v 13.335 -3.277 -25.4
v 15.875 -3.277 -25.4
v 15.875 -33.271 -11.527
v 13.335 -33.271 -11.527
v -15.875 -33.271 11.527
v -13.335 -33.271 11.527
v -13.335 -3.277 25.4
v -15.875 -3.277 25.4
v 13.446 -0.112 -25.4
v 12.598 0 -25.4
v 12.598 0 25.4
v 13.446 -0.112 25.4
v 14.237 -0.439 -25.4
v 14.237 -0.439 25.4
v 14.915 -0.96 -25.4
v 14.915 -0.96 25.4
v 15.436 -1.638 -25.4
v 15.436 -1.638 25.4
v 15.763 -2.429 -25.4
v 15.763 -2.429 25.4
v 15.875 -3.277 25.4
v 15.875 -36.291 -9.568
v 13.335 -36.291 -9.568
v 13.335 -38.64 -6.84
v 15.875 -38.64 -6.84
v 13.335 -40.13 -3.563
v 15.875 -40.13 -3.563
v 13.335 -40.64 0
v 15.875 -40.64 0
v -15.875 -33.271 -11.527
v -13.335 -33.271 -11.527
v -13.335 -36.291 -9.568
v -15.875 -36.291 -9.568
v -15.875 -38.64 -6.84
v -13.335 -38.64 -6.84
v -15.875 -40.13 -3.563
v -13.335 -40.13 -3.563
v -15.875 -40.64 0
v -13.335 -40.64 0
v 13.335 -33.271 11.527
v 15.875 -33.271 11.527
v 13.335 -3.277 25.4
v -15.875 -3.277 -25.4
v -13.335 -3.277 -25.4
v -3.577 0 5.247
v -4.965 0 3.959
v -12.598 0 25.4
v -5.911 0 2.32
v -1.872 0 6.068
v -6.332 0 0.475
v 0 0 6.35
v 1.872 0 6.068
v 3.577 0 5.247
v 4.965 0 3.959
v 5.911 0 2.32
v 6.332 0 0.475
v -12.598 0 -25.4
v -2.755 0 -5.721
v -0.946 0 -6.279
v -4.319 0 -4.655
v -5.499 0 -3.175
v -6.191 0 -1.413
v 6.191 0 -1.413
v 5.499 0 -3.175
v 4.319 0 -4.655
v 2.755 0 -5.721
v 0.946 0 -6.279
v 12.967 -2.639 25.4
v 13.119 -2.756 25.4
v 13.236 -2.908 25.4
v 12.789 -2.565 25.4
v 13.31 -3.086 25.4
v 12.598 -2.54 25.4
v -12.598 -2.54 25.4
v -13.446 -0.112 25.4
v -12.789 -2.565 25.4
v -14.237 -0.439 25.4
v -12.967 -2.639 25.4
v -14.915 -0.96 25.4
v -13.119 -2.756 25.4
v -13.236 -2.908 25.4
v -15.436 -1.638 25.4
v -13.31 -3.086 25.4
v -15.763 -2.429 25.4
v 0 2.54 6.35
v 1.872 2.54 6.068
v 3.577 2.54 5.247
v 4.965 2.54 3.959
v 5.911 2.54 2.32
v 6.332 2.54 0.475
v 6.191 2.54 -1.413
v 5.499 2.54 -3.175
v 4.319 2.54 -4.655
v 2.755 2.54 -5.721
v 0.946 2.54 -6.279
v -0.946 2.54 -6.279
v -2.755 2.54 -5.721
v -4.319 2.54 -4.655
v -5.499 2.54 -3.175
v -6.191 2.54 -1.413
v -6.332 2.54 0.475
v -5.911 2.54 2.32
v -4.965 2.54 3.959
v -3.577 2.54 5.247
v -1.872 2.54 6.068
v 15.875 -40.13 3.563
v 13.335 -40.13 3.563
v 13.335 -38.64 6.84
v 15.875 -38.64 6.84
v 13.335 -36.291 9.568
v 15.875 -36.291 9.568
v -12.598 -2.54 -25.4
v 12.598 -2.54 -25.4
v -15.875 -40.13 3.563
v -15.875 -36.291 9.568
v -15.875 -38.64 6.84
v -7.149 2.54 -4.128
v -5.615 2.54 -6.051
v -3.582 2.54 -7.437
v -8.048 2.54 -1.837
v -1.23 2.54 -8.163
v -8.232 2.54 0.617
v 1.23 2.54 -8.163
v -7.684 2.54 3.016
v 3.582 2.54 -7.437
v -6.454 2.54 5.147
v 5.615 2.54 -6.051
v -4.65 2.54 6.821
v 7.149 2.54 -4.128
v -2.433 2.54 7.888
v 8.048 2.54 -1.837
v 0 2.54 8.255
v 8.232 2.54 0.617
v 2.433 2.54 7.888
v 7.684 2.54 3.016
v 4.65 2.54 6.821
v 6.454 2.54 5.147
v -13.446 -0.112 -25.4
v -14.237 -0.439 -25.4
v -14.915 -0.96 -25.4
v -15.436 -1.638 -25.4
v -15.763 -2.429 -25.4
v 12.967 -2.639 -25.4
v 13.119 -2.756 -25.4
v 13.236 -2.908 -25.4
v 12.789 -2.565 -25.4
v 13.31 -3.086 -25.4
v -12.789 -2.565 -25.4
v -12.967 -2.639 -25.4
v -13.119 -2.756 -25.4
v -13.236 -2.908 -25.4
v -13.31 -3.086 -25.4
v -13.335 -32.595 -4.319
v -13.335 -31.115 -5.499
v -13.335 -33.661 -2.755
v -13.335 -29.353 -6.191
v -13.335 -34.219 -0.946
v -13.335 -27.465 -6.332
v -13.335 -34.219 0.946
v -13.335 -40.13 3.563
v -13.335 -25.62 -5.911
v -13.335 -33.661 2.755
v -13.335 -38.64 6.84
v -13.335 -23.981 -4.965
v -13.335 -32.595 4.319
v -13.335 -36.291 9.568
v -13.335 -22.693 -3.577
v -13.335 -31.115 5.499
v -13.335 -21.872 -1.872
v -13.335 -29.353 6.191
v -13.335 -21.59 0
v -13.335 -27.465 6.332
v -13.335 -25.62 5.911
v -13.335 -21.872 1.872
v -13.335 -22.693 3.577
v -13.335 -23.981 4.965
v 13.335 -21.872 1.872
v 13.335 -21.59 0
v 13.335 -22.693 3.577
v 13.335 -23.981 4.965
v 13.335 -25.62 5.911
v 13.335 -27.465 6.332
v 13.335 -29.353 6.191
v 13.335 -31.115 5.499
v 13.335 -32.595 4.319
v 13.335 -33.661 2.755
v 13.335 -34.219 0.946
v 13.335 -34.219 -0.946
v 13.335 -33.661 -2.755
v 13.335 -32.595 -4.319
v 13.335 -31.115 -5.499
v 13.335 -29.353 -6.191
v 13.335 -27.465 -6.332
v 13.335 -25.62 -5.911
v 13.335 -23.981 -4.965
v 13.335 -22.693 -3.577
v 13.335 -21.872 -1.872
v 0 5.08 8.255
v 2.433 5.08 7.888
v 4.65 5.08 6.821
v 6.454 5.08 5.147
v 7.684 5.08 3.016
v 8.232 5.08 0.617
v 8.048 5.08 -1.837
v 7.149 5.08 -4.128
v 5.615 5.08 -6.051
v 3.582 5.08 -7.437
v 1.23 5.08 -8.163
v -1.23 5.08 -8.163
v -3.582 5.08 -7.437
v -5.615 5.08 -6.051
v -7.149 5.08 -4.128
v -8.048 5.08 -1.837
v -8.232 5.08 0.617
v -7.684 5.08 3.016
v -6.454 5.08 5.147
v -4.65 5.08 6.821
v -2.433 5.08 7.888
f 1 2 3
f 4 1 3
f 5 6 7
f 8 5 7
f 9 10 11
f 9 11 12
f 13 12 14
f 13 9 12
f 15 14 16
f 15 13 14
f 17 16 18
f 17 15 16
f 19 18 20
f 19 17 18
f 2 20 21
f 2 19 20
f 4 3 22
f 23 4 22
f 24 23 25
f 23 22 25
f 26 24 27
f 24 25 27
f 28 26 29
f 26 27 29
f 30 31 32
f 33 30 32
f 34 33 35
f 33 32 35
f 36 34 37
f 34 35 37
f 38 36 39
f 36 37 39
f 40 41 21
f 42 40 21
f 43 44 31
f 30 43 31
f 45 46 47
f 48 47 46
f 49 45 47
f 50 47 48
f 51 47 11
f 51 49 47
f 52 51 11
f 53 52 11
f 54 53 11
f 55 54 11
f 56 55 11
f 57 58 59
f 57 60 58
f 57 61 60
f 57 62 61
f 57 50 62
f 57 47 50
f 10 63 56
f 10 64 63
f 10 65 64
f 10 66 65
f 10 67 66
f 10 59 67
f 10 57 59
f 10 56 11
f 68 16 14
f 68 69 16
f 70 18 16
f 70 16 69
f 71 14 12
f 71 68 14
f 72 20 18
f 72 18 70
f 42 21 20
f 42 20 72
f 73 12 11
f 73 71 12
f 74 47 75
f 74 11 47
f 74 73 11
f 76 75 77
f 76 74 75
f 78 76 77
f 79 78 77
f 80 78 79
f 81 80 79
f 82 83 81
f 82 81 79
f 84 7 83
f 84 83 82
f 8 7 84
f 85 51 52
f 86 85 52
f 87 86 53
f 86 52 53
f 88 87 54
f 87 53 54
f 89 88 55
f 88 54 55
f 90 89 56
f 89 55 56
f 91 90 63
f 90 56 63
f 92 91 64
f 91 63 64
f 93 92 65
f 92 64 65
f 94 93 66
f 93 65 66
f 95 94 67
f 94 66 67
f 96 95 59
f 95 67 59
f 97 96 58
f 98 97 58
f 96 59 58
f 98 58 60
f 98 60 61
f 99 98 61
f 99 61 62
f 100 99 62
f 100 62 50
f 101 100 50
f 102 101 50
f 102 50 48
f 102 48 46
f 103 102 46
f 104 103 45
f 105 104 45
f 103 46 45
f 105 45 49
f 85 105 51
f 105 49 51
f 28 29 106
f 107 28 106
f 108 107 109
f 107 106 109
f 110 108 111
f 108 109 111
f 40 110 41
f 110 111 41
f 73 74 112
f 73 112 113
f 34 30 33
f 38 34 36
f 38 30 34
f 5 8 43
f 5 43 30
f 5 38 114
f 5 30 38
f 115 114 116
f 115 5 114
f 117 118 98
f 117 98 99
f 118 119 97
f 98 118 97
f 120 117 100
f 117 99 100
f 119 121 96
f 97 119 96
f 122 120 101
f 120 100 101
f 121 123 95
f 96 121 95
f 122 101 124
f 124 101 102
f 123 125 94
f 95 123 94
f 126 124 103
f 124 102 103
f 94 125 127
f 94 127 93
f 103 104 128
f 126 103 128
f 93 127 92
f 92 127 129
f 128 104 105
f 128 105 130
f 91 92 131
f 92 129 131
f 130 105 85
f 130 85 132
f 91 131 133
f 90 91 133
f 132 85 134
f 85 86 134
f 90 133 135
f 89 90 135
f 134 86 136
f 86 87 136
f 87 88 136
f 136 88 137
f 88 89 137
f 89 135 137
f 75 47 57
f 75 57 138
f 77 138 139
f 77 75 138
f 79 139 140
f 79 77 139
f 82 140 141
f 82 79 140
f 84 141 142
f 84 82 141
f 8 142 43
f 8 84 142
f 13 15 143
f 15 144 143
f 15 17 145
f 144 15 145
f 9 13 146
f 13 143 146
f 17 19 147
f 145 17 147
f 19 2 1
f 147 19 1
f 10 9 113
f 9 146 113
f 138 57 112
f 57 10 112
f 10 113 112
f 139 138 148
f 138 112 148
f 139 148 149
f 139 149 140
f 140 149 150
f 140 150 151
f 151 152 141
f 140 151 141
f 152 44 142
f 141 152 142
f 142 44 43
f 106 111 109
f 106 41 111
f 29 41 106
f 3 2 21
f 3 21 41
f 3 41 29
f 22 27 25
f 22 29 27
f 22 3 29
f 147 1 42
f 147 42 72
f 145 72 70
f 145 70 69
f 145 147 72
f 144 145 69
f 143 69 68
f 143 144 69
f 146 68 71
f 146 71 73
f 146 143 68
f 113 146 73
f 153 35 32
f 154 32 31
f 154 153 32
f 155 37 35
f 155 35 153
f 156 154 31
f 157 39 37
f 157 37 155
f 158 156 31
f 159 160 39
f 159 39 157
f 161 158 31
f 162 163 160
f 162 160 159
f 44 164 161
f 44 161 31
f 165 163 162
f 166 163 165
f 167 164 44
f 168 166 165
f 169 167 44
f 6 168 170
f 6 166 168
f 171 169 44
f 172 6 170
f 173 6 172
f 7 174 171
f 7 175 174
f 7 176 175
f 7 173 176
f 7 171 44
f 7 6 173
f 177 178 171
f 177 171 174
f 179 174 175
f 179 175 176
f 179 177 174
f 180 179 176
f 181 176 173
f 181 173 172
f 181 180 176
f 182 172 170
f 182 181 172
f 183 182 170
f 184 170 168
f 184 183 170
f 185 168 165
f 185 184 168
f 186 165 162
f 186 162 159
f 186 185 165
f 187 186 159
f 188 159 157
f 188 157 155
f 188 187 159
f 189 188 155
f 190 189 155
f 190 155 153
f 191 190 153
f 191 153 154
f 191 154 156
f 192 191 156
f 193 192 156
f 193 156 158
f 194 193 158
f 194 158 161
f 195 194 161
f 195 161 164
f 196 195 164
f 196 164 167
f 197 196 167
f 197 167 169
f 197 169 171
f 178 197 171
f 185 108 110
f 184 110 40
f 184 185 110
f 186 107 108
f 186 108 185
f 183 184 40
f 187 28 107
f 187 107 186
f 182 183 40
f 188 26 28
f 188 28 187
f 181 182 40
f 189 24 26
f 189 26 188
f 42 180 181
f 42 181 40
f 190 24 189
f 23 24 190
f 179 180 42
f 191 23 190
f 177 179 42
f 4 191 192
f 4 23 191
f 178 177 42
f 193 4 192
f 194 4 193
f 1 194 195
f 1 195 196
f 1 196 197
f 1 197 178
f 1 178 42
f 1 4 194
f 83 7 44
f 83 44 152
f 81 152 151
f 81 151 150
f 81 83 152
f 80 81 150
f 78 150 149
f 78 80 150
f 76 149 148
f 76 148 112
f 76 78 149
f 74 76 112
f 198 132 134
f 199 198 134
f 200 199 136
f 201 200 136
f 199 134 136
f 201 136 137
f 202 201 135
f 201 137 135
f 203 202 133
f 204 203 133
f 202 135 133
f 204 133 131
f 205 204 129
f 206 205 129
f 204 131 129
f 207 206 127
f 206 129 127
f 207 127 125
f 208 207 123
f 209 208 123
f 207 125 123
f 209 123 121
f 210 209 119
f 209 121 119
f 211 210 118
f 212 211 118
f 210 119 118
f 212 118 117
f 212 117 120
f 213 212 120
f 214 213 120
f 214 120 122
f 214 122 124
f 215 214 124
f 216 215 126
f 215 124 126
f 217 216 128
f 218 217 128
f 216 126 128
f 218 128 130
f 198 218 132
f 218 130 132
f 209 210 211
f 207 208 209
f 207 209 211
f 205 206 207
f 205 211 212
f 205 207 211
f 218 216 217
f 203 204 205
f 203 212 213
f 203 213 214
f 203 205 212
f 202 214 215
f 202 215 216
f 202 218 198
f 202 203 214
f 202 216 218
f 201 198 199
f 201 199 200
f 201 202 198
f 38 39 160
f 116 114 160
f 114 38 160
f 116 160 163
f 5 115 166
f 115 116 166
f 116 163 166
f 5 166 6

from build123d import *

# Parameters (mm, degrees)
SKETCH2_W                      = 31.75
SKETCH2_H                      = 50.8
BASE_FLANGE1_DEPTH             = 2.54
EDGE_FLANGE1_STRIP_W           = 11.6332
EDGE_FLANGE1_STRIP_H           = 2.54
EDGE_FLANGE1_STRIP_CUT_DEPTH   = 50.8
EDGE_FLANGE1_STRIP_2_W         = 11.6332
EDGE_FLANGE1_STRIP_2_H         = 2.54
EDGE_FLANGE1_STRIP_CUT_2_DEPTH = 50.8
EDGE_FLANGE1_DEPTH             = 50.8
EDGE_FLANGE1_BEND_DEPTH        = 50.8
CUT_EXTRUDE1_DEPTH             = 58.487669113
BOSS_EXTRUDE1_START            = -2.54
SKETCH14_R                     = 6.35
BOSS_EXTRUDE1_DEPTH            = 27.94
SKETCH15_R                     = 6.35
BOSS_EXTRUDE2_DEPTH            = 2.54
SKETCH16_R                     = 8.255
BOSS_EXTRUDE3_DEPTH            = 2.54


# Sheet-metal steps are written as plain solids
with BuildPart() as part:
    # Sketch2 → Base-Flange1 (new body)
    with BuildSketch(Plane(origin=(0, 0, 0), x_dir=(1, 0, 0), z_dir=(0, 1, 0))):
        Rectangle(SKETCH2_W, SKETCH2_H)
    extrude(amount=-BASE_FLANGE1_DEPTH)

    # Edge-Flange1 strip (across the edge) → Edge-Flange1 strip cut (cut)
    with BuildSketch(Plane(origin=(15.875, -2.54, -25.4), x_dir=(-1, 0, 0), z_dir=(0, 0, 1))):
        with Locations((-2.54, -1.27)):
            Rectangle(EDGE_FLANGE1_STRIP_W, EDGE_FLANGE1_STRIP_H)
    extrude(amount=EDGE_FLANGE1_STRIP_CUT_DEPTH, mode=Mode.SUBTRACT)

    # Edge-Flange1 strip 2 (across the edge) → Edge-Flange1 strip cut 2 (cut)
    with BuildSketch(Plane(origin=(-15.875, -2.54, 25.4), x_dir=(1, 0, 0), z_dir=(0, 0, -1))):
        with Locations((-2.54, -1.27)):
            Rectangle(EDGE_FLANGE1_STRIP_2_W, EDGE_FLANGE1_STRIP_2_H)
    extrude(amount=EDGE_FLANGE1_STRIP_CUT_2_DEPTH, mode=Mode.SUBTRACT)

    # Edge-Flange1 section (across the edge) → Edge-Flange1 (add)
    with BuildSketch(Plane(origin=(15.875, -2.54, -25.4), x_dir=(-1, 0, 0), z_dir=(0, 0, 1))):
        with BuildLine():
            Line((0, 0.7366), (0, 38.1))
            Line((0, 38.1), (2.54, 38.1))
            Line((2.54, 38.1), (2.54, 0.7366))
            ThreePointArc((2.54, 0.7366), (2.755745145, 0.215745145), (3.2766, 0))
            Line((3.2766, 0), (3.2766, -2.54))
            ThreePointArc((3.2766, -2.54), (0.959693921, -1.580306079), (0, 0.7366))
        make_face()
    extrude(amount=EDGE_FLANGE1_DEPTH)

    # Edge-Flange1 section 2 (across the edge) → Edge-Flange1 bend (add)
    with BuildSketch(Plane(origin=(-15.875, -2.54, 25.4), x_dir=(1, 0, 0), z_dir=(0, 0, -1))):
        with BuildLine():
            Line((0, 0.7366), (0, 38.1))
            Line((0, 38.1), (2.54, 38.1))
            Line((2.54, 38.1), (2.54, 0.7366))
            ThreePointArc((2.54, 0.7366), (2.755745145, 0.215745145), (3.2766, 0))
            Line((3.2766, 0), (3.2766, -2.54))
            ThreePointArc((3.2766, -2.54), (0.959693921, -1.580306079), (0, 0.7366))
        make_face()
    extrude(amount=EDGE_FLANGE1_BEND_DEPTH)

    # Sketch13 → Cut-Extrude1 (cut, through all)
    with BuildSketch(Plane(origin=(15.875, 0, 0), x_dir=(0, 0, -1), z_dir=(1, 0, 0))):
        with BuildLine():
            Line((-25.4, -40.64), (3e-08, -40.64))
            ThreePointArc((3e-08, -40.64), (-6.840376035, -38.640432501), (-11.526768838, -33.271378824))
            Line((-11.526768838, -33.271378824), (-25.4, -3.2766))
            Line((-25.4, -3.2766), (-25.4, -40.64))
        make_face()
        with BuildLine():
            Line((25.4, -3.2766), (11.526768838, -33.271378824))
            ThreePointArc((11.526768838, -33.271378824), (6.84037606, -38.640432485), (3e-08, -40.64))
            Line((3e-08, -40.64), (25.4, -40.64))
            Line((25.4, -40.64), (25.4, -3.2766))
        make_face()
    extrude(amount=-CUT_EXTRUDE1_DEPTH, mode=Mode.SUBTRACT)

    # Sketch14 → Boss-Extrude1 (add)
    with BuildSketch(Plane(origin=(15.875, 0, 0), x_dir=(0, 0, -1), z_dir=(1, 0, 0)).offset(BOSS_EXTRUDE1_START)):
        with Locations(Location((0, -27.94, 0), (0, 0, 90))):
            Circle(SKETCH14_R)
    extrude(amount=-BOSS_EXTRUDE1_DEPTH)

    # Sketch15 → Boss-Extrude2 (add)
    with BuildSketch(Plane(origin=(0, 0, 0), x_dir=(1, 0, 0), z_dir=(0, 1, 0))):
        with Locations(Location((0, 0, 0), (0, 0, 270))):
            Circle(SKETCH15_R)
    extrude(amount=BOSS_EXTRUDE2_DEPTH)

    # Sketch16 → Boss-Extrude3 (add)
    with BuildSketch(Plane(origin=(0, 2.54, 0), x_dir=(1, 0, 0), z_dir=(0, 1, 0))):
        with Locations(Location((0, 0, 0), (0, 0, 270))):
            Circle(SKETCH16_R)
    extrude(amount=BOSS_EXTRUDE3_DEPTH)


solid = part.part
